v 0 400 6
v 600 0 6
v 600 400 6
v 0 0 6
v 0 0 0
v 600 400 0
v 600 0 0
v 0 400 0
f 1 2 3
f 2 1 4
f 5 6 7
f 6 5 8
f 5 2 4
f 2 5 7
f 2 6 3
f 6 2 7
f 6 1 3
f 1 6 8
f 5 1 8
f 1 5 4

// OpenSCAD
$fn = 64;

length = 600;   // mm
width  = 400;   // mm
thick  = 6;     // mm (MDF sheet thickness)

color([0.78, 0.67, 0.50])
cube([length, width, thick], center=false);
